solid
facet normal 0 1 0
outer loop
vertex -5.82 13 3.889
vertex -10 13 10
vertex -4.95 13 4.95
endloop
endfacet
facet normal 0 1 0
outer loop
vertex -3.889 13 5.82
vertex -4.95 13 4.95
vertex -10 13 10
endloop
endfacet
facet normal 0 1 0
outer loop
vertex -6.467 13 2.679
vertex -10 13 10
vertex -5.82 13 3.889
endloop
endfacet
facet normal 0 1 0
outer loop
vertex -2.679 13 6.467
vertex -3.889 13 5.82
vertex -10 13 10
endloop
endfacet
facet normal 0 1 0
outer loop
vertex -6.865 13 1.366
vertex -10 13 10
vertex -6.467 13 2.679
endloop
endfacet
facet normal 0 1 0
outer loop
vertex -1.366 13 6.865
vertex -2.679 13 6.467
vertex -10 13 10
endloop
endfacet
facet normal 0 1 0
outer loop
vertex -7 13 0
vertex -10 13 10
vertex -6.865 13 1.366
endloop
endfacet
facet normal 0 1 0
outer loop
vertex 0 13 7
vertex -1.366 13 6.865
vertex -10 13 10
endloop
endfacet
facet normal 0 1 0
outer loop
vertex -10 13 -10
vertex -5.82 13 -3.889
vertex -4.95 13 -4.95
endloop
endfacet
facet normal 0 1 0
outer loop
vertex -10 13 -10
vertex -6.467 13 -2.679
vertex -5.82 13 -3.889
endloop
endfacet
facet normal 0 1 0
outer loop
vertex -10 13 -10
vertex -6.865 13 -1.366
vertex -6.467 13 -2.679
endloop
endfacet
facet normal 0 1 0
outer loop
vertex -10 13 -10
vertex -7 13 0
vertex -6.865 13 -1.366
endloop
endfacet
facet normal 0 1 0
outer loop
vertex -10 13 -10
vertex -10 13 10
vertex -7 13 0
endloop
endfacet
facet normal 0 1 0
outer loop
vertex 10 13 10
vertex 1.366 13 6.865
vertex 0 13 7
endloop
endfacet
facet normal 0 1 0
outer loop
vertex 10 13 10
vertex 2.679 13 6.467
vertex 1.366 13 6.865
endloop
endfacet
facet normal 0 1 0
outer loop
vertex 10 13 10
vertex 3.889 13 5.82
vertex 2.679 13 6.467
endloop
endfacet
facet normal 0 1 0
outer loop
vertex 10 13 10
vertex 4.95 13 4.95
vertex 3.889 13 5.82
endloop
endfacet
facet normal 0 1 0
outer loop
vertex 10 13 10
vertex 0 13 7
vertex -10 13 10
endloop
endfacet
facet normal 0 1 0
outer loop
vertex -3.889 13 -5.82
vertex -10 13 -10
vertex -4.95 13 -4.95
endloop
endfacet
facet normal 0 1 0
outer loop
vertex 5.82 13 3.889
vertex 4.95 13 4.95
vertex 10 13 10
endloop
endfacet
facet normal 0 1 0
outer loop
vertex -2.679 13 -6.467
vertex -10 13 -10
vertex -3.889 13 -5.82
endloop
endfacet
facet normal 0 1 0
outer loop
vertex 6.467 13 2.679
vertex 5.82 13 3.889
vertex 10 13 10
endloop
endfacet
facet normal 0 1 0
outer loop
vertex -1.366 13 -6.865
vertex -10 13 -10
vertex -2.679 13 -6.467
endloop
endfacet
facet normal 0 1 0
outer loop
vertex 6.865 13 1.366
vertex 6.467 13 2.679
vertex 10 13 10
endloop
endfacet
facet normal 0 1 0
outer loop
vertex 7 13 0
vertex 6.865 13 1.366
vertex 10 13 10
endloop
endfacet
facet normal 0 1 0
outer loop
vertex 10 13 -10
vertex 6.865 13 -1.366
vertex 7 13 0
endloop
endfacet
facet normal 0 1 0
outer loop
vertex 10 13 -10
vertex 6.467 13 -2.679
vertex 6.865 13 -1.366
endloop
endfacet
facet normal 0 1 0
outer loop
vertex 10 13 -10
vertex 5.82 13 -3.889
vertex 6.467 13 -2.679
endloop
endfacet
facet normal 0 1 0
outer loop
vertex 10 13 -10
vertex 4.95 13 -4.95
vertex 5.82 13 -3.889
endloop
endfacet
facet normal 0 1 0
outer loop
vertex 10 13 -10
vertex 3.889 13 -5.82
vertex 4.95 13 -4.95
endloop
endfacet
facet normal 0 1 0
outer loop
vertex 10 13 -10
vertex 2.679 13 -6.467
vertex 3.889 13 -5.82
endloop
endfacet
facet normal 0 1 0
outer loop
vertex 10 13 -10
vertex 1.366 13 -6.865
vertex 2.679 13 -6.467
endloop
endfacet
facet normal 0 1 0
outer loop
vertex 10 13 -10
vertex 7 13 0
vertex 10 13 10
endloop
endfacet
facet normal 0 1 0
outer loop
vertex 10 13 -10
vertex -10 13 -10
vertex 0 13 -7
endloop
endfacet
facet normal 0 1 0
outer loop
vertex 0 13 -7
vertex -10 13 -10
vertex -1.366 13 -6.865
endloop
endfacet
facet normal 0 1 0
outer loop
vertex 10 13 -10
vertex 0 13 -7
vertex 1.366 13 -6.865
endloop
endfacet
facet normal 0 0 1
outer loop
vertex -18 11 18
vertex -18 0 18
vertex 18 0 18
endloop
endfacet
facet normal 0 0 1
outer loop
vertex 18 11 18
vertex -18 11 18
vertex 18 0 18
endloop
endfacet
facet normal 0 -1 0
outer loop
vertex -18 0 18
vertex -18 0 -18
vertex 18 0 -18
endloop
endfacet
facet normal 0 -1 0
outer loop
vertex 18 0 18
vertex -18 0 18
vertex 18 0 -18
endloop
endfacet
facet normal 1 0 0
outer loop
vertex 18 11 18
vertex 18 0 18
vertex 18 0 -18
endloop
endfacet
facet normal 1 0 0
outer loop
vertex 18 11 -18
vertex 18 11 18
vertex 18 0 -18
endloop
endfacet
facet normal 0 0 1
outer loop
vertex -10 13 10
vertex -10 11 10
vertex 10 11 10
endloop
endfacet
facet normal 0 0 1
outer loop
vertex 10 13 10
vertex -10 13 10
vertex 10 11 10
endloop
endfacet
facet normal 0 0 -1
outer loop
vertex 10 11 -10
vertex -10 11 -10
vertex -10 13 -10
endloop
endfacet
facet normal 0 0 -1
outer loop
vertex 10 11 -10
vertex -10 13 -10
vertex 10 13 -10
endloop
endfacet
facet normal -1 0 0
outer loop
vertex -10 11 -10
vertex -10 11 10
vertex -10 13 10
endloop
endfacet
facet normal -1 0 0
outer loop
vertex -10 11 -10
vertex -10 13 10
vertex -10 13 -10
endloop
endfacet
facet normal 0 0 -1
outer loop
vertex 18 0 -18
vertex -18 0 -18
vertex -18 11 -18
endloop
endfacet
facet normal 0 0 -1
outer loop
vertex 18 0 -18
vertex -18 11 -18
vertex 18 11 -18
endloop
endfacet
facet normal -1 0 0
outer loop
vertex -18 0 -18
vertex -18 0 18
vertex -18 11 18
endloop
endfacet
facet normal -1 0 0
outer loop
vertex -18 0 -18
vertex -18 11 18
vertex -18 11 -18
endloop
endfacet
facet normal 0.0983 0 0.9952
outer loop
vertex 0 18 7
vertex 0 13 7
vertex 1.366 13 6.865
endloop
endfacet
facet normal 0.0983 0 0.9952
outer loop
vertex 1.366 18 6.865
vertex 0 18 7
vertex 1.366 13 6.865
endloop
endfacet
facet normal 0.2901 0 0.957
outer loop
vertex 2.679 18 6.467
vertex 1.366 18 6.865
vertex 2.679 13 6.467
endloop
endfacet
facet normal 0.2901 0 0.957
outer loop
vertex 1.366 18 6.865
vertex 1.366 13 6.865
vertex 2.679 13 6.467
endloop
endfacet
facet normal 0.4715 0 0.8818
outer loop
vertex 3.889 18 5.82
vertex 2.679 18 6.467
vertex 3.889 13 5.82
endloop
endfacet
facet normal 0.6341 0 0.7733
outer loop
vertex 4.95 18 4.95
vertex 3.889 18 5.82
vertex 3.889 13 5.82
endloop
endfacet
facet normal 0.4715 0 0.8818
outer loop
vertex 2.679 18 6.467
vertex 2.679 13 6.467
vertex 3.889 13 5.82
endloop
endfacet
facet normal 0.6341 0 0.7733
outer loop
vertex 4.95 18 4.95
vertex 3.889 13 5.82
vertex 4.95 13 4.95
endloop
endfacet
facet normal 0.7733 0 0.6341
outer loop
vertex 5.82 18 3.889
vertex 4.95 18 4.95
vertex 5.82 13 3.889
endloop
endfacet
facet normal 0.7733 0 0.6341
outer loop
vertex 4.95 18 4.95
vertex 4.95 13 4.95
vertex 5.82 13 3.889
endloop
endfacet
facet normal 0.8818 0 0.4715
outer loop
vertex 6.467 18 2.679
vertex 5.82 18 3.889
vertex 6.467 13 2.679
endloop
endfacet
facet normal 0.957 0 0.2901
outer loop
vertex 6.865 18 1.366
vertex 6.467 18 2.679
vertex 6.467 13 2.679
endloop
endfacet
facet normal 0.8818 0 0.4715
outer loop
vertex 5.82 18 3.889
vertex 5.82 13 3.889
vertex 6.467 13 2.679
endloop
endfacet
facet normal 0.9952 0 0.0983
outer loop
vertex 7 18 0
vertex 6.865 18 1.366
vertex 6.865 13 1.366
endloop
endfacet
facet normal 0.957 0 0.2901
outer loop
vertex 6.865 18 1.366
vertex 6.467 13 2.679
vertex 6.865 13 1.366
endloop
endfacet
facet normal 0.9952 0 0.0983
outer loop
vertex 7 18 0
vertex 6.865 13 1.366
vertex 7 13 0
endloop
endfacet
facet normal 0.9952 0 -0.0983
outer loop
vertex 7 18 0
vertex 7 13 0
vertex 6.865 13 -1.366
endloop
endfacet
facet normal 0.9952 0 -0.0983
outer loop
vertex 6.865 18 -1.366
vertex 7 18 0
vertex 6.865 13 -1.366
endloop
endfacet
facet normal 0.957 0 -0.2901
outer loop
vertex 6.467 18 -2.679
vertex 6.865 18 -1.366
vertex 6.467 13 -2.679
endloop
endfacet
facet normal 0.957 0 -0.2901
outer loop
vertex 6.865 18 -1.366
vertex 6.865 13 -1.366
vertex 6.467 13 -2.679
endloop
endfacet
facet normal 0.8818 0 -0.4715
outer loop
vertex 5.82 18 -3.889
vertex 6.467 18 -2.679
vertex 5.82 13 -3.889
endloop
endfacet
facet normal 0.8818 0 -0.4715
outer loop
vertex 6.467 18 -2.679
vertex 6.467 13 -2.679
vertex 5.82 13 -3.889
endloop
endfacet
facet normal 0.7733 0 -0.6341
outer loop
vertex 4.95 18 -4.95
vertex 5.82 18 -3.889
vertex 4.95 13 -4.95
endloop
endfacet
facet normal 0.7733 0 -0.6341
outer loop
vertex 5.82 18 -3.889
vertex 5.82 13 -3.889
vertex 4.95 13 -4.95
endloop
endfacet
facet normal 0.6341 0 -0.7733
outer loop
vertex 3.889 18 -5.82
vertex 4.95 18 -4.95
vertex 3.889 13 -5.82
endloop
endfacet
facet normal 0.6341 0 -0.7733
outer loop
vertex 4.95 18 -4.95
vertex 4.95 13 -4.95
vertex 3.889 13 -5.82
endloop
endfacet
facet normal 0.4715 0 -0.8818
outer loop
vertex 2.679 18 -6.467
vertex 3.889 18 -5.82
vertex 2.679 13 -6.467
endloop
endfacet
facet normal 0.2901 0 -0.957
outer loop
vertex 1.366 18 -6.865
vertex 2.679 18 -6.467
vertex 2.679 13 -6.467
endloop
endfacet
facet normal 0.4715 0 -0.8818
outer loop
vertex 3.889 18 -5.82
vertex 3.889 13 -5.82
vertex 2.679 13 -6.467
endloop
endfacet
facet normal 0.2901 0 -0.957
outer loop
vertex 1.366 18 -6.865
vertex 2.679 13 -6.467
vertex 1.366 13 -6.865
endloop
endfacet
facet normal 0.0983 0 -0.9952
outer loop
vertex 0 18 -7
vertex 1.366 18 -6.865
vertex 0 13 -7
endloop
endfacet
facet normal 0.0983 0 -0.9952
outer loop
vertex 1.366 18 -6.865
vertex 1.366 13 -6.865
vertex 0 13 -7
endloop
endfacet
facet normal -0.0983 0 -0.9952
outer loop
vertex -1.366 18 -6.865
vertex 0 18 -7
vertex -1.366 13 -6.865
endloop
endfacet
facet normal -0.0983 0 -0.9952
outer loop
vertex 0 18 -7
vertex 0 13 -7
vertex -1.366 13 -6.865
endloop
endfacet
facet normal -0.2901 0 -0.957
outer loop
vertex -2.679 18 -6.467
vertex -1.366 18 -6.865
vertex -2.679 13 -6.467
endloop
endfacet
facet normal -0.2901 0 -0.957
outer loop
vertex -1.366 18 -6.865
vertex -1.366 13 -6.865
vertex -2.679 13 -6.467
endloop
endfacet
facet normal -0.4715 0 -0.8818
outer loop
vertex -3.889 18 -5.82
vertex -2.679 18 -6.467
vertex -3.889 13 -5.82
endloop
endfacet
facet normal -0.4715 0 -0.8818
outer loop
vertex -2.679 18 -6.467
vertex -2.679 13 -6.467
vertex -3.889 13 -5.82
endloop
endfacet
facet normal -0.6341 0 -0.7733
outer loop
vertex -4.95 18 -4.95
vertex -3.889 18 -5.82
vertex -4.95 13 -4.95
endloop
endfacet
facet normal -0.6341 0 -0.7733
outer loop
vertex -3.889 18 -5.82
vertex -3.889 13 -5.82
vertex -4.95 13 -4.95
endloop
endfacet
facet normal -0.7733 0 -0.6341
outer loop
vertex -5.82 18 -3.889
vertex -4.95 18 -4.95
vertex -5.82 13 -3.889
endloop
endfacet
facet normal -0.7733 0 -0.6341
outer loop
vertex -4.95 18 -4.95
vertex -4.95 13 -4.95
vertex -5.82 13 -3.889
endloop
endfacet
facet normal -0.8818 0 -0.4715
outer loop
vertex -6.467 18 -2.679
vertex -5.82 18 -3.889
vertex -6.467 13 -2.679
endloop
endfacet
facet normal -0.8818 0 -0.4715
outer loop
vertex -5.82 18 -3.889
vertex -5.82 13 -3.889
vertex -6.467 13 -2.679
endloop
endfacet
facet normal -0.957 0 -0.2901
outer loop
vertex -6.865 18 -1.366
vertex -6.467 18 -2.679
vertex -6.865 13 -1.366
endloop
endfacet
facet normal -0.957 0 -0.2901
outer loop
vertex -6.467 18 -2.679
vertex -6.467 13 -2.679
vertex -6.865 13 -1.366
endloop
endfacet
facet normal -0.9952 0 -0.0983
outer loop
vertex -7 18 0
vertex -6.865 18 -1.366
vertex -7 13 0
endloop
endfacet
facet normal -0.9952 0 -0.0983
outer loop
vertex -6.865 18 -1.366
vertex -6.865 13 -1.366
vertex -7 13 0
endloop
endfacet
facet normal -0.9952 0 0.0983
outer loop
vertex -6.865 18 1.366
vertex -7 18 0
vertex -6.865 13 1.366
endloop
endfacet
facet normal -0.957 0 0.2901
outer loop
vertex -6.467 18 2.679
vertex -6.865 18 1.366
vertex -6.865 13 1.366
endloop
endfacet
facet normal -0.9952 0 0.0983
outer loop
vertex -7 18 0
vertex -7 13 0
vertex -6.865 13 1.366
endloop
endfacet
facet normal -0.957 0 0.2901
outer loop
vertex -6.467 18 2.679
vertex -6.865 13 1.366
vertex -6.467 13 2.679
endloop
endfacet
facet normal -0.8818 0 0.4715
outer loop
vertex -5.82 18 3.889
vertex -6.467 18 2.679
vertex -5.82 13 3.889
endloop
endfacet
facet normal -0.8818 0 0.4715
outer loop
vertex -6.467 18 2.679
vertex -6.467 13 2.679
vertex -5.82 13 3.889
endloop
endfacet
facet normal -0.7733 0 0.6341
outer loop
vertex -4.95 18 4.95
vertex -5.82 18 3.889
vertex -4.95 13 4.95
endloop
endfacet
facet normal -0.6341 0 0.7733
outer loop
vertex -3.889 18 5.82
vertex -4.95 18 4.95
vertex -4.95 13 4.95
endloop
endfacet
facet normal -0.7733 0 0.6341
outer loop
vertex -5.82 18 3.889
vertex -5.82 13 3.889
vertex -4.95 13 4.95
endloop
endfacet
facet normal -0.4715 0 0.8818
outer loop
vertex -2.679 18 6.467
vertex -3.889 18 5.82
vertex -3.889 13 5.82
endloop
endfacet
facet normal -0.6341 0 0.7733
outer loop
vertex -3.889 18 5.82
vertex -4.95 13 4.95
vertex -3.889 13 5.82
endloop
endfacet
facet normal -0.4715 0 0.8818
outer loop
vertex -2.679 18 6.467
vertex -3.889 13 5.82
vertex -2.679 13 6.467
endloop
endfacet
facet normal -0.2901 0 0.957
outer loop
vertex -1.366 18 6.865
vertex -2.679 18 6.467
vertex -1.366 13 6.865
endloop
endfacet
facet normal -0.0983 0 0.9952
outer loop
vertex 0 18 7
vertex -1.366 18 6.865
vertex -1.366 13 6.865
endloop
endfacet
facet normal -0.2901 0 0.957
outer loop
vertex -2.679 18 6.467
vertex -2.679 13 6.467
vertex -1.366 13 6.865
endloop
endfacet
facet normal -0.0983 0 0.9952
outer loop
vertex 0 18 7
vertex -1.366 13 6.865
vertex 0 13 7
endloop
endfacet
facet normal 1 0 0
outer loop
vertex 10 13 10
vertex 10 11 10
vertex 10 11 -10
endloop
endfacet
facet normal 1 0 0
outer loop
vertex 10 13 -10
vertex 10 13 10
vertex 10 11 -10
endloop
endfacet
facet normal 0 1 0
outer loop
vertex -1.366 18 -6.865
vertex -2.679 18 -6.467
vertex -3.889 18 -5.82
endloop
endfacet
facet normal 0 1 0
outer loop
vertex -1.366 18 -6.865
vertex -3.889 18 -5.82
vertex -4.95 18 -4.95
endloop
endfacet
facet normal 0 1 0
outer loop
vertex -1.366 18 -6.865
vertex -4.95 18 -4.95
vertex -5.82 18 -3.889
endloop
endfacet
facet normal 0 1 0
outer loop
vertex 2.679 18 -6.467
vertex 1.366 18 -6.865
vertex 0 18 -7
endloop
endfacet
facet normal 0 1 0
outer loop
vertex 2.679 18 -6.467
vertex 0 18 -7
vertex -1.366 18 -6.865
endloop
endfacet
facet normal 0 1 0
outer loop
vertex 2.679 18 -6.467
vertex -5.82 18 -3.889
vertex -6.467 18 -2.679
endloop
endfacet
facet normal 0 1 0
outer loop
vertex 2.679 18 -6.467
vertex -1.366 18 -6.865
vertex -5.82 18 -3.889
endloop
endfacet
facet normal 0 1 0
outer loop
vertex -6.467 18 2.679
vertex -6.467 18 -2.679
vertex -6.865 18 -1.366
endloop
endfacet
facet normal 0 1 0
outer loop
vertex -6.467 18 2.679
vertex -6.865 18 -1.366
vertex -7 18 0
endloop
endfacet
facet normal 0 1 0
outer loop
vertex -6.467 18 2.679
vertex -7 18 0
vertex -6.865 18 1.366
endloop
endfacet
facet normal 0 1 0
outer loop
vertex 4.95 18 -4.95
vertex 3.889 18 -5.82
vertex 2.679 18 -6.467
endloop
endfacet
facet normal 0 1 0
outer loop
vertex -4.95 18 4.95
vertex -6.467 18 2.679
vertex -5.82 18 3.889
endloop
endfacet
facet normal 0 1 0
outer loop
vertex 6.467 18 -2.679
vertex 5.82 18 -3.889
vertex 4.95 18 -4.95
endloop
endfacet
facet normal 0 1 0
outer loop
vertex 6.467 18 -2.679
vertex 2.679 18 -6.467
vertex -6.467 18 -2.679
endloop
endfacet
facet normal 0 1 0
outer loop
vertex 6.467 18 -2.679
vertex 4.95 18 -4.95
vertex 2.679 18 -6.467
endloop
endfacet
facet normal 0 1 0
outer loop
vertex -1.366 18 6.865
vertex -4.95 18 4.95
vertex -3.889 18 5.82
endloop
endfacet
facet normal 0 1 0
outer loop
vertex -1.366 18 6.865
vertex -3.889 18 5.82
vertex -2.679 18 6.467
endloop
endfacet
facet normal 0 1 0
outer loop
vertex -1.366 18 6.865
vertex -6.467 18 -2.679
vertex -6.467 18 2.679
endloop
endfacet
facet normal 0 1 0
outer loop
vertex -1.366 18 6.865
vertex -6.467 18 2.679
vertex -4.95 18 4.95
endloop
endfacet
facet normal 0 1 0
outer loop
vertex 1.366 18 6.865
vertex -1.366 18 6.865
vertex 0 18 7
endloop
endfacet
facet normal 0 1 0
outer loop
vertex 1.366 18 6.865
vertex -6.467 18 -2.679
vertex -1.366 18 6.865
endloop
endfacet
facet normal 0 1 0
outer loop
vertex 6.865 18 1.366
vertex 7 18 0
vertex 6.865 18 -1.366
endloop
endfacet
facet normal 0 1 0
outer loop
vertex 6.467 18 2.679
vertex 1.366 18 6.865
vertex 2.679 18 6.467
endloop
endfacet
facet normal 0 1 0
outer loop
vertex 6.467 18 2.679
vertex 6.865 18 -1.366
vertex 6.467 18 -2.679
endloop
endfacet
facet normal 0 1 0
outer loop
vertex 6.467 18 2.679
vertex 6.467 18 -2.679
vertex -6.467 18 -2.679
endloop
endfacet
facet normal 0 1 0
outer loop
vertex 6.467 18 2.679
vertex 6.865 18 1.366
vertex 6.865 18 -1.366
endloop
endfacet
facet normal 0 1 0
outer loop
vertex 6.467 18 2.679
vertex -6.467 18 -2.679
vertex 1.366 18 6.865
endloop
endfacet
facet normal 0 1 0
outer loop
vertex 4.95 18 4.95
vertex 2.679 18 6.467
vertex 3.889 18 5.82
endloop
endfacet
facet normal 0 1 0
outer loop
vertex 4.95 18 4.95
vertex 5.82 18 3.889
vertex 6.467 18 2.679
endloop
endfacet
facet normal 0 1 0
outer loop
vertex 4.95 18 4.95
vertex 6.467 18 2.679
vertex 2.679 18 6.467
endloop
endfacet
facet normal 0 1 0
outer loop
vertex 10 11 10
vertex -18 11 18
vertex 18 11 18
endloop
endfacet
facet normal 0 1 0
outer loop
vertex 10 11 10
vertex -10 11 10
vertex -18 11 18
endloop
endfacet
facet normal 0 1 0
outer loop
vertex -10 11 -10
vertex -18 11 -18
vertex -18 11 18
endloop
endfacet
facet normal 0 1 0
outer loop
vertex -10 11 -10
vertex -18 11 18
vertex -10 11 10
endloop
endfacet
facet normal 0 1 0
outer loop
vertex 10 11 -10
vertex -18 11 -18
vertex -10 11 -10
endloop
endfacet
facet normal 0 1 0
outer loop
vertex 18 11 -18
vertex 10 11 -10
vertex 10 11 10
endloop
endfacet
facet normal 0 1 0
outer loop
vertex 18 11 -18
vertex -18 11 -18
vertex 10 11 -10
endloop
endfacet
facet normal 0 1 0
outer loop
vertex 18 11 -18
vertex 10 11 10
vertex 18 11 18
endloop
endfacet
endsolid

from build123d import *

# Parameters (mm, degrees)
SKETCH_1_W      = 36
SKETCH_1_H      = 36
EXTRUDE_1_DEPTH = 11
SKETCH_2_W      = 20
SKETCH_2_H      = 20
EXTRUDE_2_DEPTH = 2
SKETCH_4_R      = 7
EXTRUDE_4_DEPTH = 5


with BuildPart() as part:
    # 草图1 → 凸台-拉伸1 (new body)
    with BuildSketch(Plane(origin=(0, 0, 0), x_dir=(1, 0, 0), z_dir=(0, 1, 0))):
        Rectangle(SKETCH_1_W, SKETCH_1_H)
    extrude(amount=EXTRUDE_1_DEPTH)

    # 草图2 → 凸台-拉伸2 (add)
    with BuildSketch(Plane(origin=(0, 11, 0), x_dir=(1, 0, 0), z_dir=(0, 1, 0))):
        Rectangle(SKETCH_2_W, SKETCH_2_H)
    extrude(amount=EXTRUDE_2_DEPTH)

    # 草图4 → 凸台-拉伸4 (add)
    with BuildSketch(Plane(origin=(0, 13, 0), x_dir=(1, 0, 0), z_dir=(0, 1, 0))):
        with Locations(Location((0, 0, 0), (0, 0, 270))):
            Circle(SKETCH_4_R)
    extrude(amount=EXTRUDE_4_DEPTH)


solid = part.part
